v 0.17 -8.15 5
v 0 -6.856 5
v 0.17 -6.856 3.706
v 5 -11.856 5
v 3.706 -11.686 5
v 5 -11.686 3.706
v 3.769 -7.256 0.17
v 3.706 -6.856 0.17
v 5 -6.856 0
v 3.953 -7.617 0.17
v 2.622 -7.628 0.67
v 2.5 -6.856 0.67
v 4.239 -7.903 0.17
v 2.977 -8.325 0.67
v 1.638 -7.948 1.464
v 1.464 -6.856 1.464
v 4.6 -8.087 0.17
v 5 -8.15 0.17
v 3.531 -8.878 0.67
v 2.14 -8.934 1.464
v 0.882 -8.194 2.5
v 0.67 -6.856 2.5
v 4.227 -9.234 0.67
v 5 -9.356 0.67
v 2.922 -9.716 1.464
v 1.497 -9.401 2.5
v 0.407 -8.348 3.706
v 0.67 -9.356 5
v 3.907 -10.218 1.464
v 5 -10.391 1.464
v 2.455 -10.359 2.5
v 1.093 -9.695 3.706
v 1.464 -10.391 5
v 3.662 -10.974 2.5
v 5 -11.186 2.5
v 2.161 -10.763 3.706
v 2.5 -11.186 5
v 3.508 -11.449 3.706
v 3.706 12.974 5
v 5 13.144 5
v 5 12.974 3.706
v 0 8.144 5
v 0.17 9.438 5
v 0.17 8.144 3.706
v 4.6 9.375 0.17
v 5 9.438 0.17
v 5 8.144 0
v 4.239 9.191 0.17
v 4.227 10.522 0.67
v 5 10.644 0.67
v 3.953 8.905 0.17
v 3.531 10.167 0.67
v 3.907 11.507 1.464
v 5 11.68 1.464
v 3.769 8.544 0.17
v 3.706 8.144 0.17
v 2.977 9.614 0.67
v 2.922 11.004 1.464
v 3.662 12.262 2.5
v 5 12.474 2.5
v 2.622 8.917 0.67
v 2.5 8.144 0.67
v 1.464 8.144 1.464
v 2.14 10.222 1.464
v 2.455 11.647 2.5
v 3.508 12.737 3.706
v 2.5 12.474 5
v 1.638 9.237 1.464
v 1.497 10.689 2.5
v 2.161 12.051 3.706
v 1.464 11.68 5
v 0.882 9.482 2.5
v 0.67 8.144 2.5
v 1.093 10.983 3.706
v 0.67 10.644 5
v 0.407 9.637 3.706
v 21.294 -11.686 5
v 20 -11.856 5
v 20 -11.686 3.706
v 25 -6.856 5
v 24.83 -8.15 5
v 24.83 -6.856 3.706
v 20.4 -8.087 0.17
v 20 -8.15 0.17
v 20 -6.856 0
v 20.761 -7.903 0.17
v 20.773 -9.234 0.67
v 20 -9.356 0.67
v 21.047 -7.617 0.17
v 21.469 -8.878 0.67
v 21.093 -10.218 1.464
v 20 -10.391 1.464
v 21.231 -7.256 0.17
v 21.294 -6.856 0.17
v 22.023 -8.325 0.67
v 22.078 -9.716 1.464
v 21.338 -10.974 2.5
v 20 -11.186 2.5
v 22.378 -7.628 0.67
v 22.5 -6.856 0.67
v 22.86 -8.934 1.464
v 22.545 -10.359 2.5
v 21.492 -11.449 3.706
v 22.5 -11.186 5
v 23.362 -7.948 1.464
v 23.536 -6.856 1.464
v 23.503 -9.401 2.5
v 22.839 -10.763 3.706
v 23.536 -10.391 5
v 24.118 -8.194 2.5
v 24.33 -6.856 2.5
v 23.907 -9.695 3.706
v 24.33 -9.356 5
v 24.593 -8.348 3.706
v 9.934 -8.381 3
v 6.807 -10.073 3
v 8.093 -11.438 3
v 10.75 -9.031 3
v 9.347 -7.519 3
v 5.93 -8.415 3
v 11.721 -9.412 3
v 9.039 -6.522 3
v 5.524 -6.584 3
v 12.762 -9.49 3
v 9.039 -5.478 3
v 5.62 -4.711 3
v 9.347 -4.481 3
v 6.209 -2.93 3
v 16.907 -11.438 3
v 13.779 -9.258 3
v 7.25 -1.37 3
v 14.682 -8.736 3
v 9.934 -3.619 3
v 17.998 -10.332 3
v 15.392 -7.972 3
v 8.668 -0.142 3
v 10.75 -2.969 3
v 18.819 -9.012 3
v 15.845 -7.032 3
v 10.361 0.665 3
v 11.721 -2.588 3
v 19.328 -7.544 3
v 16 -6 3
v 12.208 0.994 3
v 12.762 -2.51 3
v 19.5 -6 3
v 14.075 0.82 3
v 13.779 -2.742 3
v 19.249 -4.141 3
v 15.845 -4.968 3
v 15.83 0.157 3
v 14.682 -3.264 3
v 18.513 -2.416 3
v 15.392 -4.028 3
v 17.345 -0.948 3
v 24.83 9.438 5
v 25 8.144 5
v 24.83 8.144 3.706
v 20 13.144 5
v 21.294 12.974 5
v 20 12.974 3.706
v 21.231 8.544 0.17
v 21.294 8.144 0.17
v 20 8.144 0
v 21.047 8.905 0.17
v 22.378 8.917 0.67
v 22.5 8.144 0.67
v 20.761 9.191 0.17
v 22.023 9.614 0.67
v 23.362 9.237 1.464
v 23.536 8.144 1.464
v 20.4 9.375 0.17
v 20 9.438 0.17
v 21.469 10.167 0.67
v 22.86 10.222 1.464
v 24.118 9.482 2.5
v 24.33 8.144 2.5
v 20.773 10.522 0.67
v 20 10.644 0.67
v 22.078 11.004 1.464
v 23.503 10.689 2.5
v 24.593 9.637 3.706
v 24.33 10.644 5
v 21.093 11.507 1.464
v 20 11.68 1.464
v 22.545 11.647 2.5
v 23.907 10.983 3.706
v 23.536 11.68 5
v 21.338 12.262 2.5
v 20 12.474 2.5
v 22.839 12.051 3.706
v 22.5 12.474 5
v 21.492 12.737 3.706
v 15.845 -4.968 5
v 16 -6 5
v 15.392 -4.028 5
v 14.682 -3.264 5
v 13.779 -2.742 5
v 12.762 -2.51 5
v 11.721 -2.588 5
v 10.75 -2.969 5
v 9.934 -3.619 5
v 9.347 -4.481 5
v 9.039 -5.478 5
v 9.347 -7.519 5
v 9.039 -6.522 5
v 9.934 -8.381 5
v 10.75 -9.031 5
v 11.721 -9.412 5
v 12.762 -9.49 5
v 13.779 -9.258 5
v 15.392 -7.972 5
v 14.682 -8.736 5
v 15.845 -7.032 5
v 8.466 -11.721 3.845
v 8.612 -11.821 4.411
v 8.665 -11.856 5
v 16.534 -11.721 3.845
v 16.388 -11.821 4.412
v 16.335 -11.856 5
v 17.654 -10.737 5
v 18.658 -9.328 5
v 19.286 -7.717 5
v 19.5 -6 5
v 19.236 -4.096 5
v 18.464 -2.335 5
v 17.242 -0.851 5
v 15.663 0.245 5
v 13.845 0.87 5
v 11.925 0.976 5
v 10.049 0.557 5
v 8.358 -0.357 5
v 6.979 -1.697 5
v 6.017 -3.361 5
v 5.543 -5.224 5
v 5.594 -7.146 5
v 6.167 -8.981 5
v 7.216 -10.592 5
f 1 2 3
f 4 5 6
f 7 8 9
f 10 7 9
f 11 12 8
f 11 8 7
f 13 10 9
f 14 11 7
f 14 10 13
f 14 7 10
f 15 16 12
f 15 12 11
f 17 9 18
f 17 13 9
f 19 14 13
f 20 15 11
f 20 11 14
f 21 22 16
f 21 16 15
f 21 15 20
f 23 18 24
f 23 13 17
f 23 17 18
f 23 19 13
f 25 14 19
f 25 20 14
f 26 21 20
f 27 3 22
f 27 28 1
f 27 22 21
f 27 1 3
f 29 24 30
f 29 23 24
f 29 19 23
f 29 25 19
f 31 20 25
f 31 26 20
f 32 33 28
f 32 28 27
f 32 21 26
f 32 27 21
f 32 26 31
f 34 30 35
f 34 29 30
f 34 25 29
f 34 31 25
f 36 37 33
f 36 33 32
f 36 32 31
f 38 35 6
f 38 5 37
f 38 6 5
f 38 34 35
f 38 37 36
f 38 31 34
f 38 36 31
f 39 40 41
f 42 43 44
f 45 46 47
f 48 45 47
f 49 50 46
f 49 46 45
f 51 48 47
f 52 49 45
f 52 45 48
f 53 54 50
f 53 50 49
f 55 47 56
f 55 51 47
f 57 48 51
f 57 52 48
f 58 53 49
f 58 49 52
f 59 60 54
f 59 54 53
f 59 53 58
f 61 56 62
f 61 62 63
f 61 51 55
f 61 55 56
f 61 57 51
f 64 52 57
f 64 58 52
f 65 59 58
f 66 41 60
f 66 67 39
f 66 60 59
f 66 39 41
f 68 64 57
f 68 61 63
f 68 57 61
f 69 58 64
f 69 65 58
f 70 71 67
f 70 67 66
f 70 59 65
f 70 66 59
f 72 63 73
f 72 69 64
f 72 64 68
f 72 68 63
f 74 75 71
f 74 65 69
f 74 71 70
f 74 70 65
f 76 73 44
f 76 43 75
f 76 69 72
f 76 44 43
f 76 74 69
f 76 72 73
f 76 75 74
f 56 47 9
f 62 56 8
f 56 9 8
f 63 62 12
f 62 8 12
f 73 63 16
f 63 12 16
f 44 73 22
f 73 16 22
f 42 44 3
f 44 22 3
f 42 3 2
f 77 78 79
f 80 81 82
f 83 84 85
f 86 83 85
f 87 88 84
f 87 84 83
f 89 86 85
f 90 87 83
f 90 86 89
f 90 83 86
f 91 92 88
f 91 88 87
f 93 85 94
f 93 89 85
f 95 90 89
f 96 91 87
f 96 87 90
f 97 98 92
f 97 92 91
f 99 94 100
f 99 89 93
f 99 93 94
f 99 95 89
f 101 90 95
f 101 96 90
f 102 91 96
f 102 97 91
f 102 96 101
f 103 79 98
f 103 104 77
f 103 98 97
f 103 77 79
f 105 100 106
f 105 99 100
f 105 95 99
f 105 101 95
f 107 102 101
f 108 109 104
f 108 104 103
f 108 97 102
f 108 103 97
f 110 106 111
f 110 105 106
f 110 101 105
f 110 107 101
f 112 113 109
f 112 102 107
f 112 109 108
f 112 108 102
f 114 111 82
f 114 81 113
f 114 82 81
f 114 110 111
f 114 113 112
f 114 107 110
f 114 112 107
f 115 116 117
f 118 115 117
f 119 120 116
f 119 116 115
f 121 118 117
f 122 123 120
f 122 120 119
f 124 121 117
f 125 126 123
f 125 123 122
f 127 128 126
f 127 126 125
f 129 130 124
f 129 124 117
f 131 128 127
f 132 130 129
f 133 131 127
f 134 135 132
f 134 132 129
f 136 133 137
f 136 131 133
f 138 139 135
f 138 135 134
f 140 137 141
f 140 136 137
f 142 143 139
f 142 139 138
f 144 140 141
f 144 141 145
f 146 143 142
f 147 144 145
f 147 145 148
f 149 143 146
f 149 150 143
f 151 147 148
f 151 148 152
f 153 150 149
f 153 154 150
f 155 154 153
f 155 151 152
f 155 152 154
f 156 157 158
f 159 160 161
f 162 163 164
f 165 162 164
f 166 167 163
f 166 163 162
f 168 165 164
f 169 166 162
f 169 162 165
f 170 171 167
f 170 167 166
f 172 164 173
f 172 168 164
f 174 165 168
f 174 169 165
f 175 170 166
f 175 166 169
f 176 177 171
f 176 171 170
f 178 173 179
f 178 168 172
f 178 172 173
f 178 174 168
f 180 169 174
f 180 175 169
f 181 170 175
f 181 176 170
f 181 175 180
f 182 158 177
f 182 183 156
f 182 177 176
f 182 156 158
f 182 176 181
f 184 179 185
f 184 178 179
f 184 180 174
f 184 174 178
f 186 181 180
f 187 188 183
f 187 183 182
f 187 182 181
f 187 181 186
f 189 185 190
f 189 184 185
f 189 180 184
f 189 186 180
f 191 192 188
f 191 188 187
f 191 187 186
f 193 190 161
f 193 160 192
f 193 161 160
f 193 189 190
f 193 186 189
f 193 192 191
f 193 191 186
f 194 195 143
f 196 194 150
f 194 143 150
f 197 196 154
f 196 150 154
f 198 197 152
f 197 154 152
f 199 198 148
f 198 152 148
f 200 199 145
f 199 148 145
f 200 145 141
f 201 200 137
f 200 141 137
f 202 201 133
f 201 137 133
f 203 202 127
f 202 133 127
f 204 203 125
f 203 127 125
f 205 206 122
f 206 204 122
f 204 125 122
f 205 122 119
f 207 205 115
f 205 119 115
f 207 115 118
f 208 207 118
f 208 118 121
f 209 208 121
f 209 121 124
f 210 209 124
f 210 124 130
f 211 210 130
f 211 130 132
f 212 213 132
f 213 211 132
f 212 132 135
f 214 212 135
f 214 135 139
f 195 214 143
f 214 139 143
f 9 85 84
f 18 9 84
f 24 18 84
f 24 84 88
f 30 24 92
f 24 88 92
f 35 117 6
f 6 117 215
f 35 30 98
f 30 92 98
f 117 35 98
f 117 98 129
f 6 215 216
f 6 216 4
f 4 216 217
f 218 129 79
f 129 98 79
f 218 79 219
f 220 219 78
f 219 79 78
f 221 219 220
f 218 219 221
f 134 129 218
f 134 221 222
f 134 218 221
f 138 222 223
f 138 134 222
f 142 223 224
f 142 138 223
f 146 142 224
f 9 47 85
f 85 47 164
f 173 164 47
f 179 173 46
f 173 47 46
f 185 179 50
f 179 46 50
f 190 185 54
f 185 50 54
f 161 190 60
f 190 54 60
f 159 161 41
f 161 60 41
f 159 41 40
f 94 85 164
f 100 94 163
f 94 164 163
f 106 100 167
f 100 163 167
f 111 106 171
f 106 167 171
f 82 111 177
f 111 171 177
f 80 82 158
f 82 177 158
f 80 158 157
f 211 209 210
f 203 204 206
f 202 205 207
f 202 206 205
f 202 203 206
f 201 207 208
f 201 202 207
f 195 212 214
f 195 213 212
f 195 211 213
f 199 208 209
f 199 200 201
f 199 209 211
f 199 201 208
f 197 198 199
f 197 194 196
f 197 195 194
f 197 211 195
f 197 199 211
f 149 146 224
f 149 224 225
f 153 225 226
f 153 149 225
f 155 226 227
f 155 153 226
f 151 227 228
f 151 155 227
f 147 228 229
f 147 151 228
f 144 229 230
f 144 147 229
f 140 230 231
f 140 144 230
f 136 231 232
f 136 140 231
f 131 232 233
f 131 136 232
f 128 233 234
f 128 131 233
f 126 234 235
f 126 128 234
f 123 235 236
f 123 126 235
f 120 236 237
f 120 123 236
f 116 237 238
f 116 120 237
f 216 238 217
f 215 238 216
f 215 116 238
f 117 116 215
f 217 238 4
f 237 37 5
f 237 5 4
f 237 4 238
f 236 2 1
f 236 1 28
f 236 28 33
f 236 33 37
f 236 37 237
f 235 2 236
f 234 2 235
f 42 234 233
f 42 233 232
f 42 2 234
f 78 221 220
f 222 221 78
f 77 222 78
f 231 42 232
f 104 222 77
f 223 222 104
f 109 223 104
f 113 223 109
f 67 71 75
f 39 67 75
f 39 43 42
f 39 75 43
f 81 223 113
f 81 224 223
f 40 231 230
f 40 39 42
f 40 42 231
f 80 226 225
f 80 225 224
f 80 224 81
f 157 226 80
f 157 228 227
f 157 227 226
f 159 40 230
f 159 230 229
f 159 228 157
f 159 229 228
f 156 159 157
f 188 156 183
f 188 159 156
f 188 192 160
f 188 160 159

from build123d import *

# Parameters (mm, degrees)
F0_W     = 25
F0_H     = 25
F1_DEPTH = 5
F2_R     = 5
F3_R     = 4.99999
F5_START = 3
F4_R     = 3.5
F5_DEPTH = 22


# Not quite as in the source:
# - a fillet or chamfer is up to 0.001 mm smaller than in the source, because OpenCascade refuses the exact size


with BuildPart() as f1:
    # F0 (on Top) → F1 (new body)
    with BuildSketch(Plane.XY):
        with Locations((12.5, 0.6441110272)):
            Rectangle(F0_W, F0_H)
    extrude(amount=F1_DEPTH)

    # F2
    f2_edges = [f1.edges().sort_by_distance(p)[0] for p in [
        (0, 13.144111, 2.5),
        (25, 13.144111, 2.5),
        (0, -11.855889, 2.5),
        (25, -11.855889, 2.5),
    ]]
    fillet(f2_edges, radius=F2_R)

    # F3 (radius 5 in the source; OpenCascade refuses exactly that, so slightly less here)
    f3_edges = [f1.edges().sort_by_distance(p)[0] for p in [
        (12.5, -11.855889, 0),
        (0, 0.644111, 0),
        (25, 0.644111, 0),
        (12.5, 13.144111, 0),
    ]]
    fillet(f3_edges, radius=F3_R)

    # F4 (on Top) → F5 (cut)
    with BuildSketch(Plane.XY.offset(F5_START)):
        with BuildLine():
            ThreePointArc((19.5, -6), (9.1718039657, 0.1581743364), (8.6648253836, -11.8558889728))
            Line((8.6648253836, -11.8558889728), (16.3351746164, -11.8558889728))
            ThreePointArc((16.3351746164, -11.8558889728), (18.6581743364, -9.3281960343), (19.5, -6))
        make_face()
        with Locations((12.5, -6)):
            Circle(F4_R, mode=Mode.SUBTRACT)
    extrude(amount=F5_DEPTH, mode=Mode.SUBTRACT)


solid = f1.part
